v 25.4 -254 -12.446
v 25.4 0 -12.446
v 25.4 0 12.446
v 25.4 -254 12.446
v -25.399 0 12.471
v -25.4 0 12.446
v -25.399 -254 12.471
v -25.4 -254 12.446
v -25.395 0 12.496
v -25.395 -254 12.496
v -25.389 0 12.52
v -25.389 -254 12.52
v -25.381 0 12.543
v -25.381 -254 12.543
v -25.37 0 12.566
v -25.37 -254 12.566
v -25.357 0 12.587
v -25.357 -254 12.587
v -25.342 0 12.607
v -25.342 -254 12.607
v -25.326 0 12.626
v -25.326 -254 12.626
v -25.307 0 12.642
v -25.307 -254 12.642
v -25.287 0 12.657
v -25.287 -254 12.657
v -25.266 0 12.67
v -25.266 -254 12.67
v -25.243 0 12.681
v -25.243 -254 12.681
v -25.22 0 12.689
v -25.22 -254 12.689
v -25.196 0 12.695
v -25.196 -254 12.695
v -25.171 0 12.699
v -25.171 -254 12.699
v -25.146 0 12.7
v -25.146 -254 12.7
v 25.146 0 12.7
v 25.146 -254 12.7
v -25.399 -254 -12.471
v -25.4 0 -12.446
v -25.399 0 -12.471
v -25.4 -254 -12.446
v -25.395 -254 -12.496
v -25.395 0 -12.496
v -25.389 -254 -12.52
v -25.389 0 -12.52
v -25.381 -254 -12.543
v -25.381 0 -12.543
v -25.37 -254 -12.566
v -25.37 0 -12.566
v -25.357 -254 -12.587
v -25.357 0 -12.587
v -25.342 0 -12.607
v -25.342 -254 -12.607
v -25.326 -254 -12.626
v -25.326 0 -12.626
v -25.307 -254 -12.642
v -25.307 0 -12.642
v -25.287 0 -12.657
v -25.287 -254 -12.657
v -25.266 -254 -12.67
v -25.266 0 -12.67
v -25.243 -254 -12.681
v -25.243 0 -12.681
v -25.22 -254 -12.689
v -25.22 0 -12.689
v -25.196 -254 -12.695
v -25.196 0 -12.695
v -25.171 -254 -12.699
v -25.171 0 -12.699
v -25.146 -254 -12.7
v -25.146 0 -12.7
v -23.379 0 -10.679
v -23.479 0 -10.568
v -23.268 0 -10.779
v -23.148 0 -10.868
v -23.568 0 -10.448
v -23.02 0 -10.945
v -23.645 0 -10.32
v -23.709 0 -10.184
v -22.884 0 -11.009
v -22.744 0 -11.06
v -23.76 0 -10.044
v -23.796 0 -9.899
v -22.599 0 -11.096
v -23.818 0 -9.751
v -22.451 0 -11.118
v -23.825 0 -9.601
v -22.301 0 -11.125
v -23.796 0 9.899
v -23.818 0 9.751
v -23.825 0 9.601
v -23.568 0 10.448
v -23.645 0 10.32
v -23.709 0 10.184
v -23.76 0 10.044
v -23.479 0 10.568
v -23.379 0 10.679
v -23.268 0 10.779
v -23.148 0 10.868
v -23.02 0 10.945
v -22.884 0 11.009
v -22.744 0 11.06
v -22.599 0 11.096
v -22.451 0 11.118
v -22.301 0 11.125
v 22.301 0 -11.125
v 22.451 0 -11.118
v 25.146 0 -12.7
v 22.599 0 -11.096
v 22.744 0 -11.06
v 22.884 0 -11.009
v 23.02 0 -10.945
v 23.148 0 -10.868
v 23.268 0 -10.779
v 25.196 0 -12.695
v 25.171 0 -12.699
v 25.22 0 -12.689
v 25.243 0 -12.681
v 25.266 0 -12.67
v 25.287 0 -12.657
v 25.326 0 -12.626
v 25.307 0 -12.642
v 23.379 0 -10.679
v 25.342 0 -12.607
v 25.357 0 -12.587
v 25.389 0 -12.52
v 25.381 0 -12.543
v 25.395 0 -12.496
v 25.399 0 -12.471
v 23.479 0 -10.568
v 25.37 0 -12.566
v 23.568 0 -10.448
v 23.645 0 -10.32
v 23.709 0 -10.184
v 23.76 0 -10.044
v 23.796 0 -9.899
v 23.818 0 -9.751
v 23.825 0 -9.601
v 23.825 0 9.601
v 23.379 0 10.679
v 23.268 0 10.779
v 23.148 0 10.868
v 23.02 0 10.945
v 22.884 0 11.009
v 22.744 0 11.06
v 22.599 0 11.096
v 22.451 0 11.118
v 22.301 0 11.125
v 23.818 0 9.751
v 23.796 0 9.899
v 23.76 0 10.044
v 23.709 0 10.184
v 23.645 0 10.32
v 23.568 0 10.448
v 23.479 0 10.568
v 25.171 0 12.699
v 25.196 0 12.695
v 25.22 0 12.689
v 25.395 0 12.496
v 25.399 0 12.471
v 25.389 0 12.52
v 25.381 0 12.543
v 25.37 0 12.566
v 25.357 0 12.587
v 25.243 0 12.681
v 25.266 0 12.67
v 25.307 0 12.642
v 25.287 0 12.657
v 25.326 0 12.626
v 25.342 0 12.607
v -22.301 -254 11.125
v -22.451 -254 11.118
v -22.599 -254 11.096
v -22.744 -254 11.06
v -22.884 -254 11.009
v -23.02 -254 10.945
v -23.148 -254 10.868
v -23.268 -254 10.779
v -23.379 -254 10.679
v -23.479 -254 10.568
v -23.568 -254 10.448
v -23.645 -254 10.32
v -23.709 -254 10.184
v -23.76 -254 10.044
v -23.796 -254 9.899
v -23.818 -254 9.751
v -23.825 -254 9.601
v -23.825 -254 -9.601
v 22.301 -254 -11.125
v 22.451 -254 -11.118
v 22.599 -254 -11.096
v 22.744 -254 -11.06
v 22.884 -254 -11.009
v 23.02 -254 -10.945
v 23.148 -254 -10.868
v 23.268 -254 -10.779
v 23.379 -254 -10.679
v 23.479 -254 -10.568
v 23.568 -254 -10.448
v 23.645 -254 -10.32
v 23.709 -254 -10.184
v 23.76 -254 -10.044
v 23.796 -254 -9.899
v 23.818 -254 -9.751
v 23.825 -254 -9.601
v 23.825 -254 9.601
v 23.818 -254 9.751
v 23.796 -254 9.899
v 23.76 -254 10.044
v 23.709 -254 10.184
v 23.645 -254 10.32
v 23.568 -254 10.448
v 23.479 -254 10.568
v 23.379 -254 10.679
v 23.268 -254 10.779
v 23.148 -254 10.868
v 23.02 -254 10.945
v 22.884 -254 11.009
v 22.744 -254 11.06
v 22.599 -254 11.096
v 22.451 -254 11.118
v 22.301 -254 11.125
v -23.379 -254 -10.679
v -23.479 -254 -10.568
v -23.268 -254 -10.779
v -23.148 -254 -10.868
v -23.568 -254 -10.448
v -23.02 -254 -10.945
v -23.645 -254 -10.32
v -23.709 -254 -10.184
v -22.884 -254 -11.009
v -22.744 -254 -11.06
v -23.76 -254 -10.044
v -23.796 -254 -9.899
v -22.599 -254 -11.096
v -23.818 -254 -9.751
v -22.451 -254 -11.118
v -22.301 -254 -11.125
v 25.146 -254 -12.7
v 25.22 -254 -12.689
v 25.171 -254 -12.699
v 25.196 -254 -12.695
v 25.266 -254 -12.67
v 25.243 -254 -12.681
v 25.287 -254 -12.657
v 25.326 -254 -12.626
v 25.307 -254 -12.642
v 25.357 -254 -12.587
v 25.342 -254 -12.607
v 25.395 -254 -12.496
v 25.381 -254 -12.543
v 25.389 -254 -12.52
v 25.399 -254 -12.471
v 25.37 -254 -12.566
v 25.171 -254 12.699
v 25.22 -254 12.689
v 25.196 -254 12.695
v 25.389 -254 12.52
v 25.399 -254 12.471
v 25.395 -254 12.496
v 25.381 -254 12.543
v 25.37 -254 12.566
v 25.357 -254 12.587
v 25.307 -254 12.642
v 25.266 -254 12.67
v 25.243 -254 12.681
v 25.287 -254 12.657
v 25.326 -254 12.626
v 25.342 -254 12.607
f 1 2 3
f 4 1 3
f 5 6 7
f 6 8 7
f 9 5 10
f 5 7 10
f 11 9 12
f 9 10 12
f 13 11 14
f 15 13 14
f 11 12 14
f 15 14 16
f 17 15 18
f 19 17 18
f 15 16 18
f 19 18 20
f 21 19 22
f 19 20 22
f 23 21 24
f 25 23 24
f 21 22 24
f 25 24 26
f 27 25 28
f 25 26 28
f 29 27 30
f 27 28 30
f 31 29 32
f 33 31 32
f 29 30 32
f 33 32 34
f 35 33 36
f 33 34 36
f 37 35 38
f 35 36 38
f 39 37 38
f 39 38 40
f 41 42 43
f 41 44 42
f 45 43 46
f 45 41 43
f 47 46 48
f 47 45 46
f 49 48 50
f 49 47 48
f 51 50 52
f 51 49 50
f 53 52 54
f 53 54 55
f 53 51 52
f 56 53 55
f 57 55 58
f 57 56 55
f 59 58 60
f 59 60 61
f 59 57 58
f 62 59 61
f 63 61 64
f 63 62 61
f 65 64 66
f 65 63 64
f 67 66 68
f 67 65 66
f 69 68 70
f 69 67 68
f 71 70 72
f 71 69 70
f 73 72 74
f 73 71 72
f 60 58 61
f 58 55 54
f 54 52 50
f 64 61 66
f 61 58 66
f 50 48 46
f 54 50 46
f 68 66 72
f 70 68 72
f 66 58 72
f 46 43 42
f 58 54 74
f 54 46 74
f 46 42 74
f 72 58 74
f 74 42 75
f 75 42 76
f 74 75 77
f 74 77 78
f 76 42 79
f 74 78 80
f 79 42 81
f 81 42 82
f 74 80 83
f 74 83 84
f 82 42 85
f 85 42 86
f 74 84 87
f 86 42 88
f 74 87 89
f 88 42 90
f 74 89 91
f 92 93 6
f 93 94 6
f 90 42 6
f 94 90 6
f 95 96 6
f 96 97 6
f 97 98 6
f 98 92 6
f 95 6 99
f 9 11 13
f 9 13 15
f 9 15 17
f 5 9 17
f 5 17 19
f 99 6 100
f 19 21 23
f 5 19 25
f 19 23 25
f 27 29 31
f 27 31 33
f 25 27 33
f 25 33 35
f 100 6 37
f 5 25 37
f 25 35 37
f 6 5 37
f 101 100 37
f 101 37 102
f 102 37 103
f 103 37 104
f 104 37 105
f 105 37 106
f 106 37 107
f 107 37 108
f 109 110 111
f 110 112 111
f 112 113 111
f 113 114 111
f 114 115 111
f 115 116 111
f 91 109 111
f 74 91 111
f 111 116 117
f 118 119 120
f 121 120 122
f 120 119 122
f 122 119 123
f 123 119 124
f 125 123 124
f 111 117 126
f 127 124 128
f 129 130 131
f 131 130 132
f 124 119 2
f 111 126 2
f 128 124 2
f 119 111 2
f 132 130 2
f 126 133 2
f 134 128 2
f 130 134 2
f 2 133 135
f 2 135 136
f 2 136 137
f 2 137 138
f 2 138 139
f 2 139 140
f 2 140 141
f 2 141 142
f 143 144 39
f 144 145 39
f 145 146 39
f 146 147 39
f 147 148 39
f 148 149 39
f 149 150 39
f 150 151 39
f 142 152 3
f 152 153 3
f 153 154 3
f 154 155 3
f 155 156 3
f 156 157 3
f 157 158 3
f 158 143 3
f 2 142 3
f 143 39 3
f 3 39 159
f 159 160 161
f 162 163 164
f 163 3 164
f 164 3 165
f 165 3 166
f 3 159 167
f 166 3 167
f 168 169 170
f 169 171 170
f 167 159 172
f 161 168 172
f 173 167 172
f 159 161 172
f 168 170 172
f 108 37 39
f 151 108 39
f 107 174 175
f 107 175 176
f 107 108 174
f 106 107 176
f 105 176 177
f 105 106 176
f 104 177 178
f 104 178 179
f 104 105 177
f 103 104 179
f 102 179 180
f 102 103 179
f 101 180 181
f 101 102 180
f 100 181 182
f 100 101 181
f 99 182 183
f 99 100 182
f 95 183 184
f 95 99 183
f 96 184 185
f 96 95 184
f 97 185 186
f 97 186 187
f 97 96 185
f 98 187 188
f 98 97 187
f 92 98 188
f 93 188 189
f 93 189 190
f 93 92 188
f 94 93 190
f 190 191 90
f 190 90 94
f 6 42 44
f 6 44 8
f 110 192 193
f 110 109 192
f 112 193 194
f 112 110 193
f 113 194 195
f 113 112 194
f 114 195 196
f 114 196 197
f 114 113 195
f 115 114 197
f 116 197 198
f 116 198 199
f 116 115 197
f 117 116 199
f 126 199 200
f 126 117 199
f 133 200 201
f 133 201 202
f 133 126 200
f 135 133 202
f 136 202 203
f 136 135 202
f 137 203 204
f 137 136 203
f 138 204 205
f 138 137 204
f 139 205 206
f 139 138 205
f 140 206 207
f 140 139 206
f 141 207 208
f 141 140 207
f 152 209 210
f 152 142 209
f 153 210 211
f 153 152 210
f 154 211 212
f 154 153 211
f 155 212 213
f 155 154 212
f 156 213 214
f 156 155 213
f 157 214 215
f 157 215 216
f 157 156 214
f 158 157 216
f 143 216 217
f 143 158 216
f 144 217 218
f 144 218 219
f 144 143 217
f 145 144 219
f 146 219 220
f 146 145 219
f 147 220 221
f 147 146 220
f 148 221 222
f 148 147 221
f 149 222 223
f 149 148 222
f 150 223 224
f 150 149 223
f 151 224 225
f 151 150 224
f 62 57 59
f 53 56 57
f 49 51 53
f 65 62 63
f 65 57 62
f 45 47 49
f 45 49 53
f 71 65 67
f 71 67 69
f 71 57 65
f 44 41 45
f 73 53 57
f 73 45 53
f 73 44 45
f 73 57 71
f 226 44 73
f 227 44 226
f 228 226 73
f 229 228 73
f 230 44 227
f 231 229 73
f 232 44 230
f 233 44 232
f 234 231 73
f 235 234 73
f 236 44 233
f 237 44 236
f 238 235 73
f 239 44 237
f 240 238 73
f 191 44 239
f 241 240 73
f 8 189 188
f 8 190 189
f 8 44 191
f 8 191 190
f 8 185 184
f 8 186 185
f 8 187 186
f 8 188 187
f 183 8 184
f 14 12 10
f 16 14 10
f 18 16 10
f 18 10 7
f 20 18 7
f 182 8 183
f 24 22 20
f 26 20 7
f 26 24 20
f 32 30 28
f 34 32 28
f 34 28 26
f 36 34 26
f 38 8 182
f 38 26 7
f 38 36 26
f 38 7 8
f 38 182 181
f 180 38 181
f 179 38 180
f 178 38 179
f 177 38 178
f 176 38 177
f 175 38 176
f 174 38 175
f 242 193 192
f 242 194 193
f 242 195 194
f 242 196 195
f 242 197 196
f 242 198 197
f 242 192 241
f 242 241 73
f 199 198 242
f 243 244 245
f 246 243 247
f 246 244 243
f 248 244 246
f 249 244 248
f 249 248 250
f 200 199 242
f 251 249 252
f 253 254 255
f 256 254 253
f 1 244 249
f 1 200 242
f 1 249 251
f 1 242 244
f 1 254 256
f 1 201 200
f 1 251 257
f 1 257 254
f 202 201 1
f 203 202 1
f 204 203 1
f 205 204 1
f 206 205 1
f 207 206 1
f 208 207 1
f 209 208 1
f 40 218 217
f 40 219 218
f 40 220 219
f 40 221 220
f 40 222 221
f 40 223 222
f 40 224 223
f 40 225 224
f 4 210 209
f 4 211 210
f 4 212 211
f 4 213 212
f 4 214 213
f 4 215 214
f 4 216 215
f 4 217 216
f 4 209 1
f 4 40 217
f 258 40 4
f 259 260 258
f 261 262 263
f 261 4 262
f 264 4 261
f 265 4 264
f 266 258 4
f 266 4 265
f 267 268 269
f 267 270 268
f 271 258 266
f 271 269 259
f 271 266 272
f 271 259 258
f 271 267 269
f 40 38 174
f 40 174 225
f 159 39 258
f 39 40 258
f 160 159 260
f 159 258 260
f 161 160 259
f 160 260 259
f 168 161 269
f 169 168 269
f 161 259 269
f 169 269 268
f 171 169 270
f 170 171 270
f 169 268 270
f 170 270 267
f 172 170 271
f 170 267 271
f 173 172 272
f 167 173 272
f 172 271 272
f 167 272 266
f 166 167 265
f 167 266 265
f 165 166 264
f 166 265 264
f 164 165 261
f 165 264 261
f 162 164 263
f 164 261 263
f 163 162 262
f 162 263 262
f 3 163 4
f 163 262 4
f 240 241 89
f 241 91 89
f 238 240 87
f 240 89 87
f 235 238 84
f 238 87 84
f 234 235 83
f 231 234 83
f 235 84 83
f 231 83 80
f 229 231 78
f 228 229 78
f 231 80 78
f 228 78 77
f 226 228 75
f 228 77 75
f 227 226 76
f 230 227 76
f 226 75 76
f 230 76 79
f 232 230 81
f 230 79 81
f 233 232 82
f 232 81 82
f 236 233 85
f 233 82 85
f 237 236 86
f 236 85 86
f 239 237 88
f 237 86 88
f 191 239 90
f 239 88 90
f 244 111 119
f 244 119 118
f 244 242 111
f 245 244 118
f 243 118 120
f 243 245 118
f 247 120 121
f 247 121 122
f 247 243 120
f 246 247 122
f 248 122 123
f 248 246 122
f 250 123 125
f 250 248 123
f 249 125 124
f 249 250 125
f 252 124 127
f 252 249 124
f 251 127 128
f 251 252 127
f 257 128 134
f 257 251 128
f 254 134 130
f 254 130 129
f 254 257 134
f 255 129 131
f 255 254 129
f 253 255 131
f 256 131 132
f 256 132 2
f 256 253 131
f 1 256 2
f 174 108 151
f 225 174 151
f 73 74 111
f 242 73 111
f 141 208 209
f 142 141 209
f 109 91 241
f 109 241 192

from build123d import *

# Parameters (mm, degrees)
F0_W     = 50.8
F0_H     = 25.4
F1_DEPTH = 254
F2_W     = 47.6504
F2_H     = 22.2504
F3_DEPTH = 254
F4_R     = 1.524
F5_R     = 0.254


with BuildPart() as f1:
    # F0 (on Front) → F1 (new body)
    with BuildSketch(Plane.XZ):
        Rectangle(F0_W, F0_H)
    extrude(amount=F1_DEPTH)

    # F2 (on face) → F3 (cut, through all)
    with BuildSketch(Plane.XZ.offset(254)):
        Rectangle(F2_W, F2_H)
    extrude(amount=-F3_DEPTH, mode=Mode.SUBTRACT)

    # F4
    f4_edges = [f1.edges().sort_by_distance(p)[0] for p in [
        (23.8252, -127, -11.1252),
        (23.8252, -127, 11.1252),
        (-23.8252, -127, -11.1252),
        (-23.8252, -127, 11.1252),
    ]]
    fillet(f4_edges, radius=F4_R)

    # F5
    f5_edges = [f1.edges().sort_by_distance(p)[0] for p in [
        (-25.4, -127, 12.7),
        (25.4, -127, 12.7),
        (25.4, -127, -12.7),
        (-25.4, -127, -12.7),
    ]]
    fillet(f5_edges, radius=F5_R)


solid = f1.part
